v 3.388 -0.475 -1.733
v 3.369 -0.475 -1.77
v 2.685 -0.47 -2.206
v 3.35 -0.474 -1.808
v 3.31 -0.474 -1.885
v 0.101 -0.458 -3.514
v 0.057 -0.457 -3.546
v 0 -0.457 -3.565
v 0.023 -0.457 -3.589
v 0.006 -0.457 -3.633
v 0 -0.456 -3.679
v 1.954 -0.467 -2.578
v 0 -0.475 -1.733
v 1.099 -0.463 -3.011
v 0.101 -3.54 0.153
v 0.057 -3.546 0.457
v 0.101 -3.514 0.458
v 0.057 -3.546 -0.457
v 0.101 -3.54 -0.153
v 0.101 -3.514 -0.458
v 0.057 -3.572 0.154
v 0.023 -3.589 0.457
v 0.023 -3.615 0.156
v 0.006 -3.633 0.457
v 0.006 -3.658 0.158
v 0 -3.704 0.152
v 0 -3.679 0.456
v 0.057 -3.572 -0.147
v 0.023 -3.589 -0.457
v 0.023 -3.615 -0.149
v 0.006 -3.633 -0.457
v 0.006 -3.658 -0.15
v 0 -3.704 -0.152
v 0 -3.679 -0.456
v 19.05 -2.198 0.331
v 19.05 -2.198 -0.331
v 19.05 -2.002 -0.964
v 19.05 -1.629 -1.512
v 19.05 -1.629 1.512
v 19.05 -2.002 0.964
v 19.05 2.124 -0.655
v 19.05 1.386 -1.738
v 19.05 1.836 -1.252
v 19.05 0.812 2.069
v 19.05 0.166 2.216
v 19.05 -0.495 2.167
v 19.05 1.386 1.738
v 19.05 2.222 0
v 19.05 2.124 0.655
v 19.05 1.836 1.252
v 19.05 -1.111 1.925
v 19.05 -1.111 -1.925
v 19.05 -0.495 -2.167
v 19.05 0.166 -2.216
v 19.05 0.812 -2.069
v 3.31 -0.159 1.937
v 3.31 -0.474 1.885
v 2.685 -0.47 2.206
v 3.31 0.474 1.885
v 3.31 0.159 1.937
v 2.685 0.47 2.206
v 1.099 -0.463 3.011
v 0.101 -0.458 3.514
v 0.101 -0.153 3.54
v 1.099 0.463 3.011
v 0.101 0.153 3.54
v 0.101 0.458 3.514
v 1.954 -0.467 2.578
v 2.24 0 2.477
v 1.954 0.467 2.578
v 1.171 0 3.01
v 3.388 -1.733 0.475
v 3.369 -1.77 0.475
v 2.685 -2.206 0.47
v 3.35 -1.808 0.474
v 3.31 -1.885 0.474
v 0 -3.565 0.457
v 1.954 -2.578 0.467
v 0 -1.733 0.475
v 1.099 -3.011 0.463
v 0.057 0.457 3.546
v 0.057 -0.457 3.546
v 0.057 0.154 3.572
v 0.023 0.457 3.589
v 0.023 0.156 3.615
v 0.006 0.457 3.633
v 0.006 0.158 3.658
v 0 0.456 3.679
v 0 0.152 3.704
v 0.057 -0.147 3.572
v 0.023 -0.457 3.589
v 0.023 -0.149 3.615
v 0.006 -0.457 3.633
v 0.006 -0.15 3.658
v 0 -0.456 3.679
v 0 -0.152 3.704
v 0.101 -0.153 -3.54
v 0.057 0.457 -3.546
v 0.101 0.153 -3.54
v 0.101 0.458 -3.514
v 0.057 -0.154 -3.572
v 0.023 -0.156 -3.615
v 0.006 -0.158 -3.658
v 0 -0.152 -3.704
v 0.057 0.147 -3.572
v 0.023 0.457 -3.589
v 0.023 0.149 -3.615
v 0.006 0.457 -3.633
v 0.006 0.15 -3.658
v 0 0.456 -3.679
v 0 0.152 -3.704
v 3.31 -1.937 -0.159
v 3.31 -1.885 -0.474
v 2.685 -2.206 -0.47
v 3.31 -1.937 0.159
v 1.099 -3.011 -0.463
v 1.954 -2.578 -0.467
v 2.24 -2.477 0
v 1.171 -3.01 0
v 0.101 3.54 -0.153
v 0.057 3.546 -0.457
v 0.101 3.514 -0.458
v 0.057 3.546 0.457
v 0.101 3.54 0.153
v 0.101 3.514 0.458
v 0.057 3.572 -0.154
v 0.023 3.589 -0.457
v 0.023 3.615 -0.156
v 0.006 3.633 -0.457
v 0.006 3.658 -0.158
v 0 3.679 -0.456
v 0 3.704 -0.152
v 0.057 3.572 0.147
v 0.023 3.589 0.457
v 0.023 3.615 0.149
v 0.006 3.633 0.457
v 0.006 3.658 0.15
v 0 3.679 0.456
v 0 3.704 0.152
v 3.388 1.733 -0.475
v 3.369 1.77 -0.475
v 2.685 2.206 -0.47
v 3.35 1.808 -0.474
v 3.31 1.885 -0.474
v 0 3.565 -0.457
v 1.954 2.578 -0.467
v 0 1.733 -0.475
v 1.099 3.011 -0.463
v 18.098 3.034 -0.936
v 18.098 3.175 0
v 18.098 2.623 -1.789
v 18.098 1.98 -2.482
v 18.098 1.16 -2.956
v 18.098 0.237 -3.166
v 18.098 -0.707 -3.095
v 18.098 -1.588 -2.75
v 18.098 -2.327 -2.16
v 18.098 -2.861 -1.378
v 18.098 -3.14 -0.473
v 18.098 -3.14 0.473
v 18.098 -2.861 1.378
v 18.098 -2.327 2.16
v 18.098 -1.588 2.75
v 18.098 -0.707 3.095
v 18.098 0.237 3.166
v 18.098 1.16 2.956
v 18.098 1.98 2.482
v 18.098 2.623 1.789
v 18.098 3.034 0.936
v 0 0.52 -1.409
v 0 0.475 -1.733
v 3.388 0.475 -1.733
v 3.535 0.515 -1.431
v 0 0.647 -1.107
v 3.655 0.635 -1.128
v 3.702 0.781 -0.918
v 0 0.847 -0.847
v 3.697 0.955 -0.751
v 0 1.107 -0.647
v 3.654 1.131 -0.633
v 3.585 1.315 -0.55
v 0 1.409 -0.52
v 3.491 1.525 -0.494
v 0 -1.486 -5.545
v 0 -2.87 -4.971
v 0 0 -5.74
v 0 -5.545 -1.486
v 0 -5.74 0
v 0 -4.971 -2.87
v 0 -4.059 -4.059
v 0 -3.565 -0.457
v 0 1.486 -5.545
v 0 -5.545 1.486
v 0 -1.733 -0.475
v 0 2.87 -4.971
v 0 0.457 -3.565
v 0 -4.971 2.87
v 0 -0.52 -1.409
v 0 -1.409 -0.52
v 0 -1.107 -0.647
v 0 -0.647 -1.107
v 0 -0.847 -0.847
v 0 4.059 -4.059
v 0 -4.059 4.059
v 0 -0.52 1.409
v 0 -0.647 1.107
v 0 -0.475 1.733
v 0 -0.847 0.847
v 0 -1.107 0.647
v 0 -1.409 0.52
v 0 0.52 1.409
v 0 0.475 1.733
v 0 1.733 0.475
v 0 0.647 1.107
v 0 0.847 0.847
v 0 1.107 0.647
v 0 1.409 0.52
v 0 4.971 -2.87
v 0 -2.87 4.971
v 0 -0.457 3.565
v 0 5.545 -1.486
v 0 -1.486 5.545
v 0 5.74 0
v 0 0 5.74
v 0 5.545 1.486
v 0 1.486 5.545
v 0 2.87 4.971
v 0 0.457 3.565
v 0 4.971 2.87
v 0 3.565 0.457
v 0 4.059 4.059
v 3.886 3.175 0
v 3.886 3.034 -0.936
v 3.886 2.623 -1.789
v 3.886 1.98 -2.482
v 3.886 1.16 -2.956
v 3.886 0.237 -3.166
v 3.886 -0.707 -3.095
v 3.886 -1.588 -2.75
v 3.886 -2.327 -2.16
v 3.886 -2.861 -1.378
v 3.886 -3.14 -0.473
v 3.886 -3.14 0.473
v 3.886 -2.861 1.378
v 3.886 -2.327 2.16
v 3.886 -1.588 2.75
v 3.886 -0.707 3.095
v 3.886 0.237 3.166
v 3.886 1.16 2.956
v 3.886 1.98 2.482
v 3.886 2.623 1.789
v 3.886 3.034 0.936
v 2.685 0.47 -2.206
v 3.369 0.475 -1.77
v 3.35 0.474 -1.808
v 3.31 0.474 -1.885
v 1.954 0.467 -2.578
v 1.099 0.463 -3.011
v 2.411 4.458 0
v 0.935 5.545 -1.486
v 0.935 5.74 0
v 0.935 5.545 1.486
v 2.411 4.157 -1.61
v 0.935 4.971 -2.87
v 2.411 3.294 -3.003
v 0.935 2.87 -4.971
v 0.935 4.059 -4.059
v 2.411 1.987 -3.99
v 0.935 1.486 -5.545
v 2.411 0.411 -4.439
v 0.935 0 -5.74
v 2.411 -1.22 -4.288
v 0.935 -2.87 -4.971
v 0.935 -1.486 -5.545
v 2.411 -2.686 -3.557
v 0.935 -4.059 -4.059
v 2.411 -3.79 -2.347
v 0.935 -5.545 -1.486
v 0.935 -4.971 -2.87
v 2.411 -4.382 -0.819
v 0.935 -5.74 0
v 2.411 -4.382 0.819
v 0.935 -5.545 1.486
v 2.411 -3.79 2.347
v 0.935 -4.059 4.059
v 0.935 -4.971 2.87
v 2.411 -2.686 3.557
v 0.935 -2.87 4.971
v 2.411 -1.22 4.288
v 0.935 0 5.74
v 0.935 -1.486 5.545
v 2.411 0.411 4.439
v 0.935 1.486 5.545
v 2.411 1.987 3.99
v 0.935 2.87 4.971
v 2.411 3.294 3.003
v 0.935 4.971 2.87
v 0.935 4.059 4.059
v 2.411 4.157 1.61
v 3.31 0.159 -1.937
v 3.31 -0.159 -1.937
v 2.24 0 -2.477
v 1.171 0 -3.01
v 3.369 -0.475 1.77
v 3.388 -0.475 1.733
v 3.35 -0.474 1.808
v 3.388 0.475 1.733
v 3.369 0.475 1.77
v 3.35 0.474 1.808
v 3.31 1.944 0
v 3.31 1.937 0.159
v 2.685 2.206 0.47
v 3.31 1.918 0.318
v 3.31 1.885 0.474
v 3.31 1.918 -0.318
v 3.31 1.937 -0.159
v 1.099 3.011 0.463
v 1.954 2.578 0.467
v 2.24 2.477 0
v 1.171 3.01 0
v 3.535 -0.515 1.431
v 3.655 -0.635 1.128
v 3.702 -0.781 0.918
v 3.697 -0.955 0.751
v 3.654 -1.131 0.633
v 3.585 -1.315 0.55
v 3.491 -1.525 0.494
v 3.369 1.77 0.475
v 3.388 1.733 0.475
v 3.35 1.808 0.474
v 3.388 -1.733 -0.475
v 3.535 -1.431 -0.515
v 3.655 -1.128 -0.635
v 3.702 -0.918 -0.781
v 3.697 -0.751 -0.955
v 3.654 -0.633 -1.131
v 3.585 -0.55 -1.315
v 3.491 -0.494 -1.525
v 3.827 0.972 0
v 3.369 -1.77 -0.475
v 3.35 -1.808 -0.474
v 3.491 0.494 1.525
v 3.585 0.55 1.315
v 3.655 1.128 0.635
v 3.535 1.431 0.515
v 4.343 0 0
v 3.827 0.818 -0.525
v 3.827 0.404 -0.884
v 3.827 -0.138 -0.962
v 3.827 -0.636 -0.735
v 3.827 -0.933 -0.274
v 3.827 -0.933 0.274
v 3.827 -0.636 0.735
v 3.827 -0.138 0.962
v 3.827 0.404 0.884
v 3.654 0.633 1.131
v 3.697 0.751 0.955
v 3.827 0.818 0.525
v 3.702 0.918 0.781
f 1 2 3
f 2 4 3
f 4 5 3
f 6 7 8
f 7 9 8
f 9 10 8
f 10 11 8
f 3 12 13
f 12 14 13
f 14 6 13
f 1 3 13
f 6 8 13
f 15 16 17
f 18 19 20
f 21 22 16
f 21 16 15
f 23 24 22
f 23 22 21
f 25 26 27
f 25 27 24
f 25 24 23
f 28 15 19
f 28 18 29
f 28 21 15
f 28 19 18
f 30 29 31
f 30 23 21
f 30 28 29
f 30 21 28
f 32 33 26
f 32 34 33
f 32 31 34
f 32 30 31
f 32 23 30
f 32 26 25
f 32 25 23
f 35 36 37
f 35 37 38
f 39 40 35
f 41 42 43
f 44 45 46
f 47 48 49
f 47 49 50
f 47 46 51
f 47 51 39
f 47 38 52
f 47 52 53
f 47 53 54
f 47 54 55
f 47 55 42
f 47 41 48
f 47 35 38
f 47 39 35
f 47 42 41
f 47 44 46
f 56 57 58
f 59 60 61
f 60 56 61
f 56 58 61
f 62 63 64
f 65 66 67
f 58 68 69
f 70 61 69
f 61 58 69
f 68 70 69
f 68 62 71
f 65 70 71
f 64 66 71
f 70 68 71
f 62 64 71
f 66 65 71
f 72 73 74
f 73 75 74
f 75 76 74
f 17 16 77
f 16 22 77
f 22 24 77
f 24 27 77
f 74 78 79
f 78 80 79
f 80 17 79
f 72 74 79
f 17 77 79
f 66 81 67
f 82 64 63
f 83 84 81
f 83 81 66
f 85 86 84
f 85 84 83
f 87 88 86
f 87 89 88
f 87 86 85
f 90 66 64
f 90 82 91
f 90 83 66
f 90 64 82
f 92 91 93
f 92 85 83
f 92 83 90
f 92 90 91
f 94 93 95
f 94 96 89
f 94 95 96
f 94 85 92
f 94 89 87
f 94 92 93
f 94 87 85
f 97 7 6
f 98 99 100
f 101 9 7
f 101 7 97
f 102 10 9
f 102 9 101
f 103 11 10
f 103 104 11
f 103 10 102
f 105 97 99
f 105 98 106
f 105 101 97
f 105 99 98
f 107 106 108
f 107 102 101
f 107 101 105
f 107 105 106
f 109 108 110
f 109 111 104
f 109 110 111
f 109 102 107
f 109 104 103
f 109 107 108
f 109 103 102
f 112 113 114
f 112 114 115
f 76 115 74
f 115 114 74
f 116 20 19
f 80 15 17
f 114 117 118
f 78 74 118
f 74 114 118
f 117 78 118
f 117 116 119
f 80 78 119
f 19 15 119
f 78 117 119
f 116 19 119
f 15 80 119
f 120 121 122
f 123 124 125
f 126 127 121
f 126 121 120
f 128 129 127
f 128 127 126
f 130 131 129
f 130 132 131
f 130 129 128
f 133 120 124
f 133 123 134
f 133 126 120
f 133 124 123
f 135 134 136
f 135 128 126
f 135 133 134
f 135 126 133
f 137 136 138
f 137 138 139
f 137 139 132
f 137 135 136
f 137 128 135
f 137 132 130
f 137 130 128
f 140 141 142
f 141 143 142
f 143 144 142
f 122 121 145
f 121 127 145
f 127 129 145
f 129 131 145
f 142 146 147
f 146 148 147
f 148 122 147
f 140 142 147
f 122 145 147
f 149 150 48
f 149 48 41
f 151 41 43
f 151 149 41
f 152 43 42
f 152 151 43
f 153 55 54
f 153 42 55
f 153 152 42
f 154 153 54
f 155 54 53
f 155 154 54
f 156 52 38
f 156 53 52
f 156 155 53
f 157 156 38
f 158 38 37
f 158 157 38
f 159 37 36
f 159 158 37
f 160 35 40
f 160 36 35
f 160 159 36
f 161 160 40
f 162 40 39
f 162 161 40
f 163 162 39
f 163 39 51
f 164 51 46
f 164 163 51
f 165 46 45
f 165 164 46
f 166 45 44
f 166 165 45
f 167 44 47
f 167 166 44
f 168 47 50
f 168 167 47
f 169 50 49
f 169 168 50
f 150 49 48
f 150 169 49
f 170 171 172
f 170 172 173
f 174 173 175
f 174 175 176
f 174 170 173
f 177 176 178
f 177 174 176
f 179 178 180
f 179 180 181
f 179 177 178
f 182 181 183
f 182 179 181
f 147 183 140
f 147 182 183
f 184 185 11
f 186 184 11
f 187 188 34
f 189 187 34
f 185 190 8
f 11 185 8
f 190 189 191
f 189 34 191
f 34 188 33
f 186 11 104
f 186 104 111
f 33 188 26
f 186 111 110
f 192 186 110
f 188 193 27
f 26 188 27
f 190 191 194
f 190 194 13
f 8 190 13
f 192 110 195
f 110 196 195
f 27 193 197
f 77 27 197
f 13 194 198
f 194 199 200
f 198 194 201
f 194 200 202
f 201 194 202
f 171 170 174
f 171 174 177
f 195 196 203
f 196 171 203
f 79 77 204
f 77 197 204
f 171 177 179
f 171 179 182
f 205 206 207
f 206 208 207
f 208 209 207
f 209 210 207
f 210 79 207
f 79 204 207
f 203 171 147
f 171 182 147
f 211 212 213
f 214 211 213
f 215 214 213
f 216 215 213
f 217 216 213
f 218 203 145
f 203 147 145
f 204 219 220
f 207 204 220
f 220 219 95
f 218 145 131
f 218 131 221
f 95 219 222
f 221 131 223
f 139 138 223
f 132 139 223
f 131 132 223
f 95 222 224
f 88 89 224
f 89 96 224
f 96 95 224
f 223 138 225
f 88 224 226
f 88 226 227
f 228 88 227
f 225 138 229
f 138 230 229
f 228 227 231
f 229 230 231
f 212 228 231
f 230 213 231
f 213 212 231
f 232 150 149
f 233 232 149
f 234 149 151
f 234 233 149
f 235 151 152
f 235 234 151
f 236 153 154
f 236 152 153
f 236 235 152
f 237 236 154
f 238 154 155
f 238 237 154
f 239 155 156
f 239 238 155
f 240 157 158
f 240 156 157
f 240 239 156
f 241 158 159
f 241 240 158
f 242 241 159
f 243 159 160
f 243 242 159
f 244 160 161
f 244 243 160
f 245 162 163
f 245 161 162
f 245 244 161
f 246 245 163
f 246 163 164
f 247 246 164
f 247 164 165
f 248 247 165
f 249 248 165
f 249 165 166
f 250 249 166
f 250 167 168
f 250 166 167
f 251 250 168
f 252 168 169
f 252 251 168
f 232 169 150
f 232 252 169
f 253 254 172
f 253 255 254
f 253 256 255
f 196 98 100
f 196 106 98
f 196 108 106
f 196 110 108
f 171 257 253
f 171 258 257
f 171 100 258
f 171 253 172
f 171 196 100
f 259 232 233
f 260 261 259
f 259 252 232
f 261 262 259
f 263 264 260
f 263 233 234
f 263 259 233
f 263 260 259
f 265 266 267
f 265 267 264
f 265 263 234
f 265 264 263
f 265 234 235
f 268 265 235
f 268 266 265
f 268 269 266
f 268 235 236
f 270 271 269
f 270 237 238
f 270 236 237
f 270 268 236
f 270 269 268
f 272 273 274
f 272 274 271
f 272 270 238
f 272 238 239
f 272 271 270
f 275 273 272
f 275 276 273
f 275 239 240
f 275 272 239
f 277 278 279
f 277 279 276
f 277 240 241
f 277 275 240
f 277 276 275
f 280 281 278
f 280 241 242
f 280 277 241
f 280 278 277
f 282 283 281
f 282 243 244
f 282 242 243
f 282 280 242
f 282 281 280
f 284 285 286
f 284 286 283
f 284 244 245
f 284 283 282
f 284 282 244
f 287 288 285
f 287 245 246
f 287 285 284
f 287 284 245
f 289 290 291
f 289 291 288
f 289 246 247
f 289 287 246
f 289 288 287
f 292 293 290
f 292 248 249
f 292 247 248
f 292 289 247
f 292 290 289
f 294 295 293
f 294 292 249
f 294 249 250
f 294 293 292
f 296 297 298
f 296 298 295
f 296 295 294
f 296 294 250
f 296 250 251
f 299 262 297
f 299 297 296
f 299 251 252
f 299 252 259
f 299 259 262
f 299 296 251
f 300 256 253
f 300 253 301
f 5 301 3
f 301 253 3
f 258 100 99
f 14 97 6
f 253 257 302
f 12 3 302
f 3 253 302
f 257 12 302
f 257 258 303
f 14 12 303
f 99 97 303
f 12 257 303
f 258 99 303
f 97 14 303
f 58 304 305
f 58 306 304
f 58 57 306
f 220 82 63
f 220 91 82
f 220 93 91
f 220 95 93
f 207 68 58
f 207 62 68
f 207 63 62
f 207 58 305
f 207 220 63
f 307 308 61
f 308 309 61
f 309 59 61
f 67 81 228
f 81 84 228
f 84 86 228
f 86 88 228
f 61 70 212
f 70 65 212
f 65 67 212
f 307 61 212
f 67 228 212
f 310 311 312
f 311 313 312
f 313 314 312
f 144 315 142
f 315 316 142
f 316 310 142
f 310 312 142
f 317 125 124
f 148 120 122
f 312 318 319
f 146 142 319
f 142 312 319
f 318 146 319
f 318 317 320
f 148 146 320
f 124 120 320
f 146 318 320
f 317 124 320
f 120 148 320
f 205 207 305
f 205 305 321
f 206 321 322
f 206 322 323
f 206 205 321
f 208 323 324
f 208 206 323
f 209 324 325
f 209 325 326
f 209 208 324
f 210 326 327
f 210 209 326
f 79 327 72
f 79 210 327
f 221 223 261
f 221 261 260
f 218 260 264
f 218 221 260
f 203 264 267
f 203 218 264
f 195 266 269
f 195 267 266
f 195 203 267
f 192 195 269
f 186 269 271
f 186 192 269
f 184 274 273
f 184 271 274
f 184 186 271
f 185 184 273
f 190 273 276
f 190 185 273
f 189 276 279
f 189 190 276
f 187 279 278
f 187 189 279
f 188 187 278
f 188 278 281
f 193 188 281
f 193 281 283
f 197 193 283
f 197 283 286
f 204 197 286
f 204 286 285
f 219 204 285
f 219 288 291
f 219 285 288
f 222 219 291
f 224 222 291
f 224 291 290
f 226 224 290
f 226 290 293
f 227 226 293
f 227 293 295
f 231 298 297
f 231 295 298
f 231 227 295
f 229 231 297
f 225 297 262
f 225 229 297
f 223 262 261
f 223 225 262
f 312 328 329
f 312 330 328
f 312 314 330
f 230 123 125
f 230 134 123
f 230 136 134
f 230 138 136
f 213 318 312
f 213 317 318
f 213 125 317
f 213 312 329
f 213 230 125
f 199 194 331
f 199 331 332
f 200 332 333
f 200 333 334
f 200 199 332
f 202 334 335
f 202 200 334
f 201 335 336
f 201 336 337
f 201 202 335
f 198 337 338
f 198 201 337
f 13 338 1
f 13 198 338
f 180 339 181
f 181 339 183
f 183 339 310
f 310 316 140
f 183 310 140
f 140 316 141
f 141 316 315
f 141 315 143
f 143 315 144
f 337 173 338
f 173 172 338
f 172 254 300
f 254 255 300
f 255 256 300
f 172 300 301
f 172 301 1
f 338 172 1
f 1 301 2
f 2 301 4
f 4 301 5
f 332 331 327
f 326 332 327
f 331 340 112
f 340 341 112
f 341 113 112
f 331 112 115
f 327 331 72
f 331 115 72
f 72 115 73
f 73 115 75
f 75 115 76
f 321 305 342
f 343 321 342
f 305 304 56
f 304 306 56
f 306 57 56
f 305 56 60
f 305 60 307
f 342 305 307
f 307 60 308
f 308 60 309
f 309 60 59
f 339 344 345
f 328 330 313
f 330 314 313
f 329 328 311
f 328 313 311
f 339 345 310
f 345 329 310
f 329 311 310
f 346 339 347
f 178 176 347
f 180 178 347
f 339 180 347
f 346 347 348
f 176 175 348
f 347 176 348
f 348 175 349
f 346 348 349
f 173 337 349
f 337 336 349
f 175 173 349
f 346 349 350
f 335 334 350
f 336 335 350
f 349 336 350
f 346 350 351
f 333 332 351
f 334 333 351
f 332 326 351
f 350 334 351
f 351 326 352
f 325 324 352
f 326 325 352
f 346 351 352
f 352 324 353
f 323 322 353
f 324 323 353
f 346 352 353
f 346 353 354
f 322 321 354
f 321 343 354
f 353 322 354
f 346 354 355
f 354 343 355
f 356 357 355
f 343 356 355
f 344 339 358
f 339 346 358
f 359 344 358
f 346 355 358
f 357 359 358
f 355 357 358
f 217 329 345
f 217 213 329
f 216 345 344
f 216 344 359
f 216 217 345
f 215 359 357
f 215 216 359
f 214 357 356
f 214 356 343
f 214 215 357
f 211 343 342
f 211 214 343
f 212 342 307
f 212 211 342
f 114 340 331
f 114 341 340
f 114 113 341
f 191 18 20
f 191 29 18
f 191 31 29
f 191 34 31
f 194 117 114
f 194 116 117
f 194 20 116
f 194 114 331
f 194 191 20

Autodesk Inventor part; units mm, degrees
ref_plane "YZ Plane" through (0, 0, 0) normal (1, 0, 0) x (0, 1, 0)
ref_plane "XZ Plane" through (0, 0, 0) normal (0, 1, 0) x (-1, 0, 0)
sketch "Sketch1" plane through (0, 0, 0) normal (0, 0, 1) x (1, 0, 0)
  line L0 (4.3434, 0) -> (19.05, 0)
  line L1 (19.05, 0) -> (19.05, 3.175)
  line L2 (19.05, 3.175) -> (3.8862, 3.175)
  line L3 (0.935, 5.7404) -> (0, 5.7404)
  line L4 (-3.81, 0) -> (22.86, 0) projected
  line L5 (0, -1.1481) -> (0, 6.8885) projected
  line L6 (0, 3.5941) -> (3.3098, 1.9439)
  line L7 (3.3098, 1.9439) -> (4.3434, 0)
  line L8 (3.8862, 3.175) -> (0.935, 5.7404)
  line L9 (0, 5.7404) -> (0, 3.5941)
  dimension "d2" = 6.35
  dimension "d3" = 11.4808
  dimension "d4" = 4.3434
  dimension "d5" = 7.1882
  dimension "d6" = 26.5
  dimension "d7" = 62
  dimension "d13" = 41
  dimension "d14" = 3.8862
  dimension "d15" = 19.05
revolve "Body" add sketch "Sketch1" angle 360 about axis through (4.3434, 0, 0) along (1, 0, 0) contours L7 L6 L5 L3 L8 L2 L1 L0
sketch "Sketch2" plane through (0, 0, 0) normal (-1, 0, 0) x (0, 0, 1)
  line L0 (0, -8.0366) -> (0, 8.0366) projected
  line L1 (-8.0366, 0) -> (8.0366, 0) projected
  line L2 (0, 3.5941) -> (0, 0) construction
  line L3 (0, 0) -> (3.5941, 0) construction
  arc A0 (1.198, 0) -> (0, 1.198) centre (0, 0) ccw
  line L4 (0, 0) -> (0.7947, 0.7947) construction
  arc A1 (1.797, 0) -> (0, 1.797) centre (0, 0) ccw construction
  line L5 (0.4572, 3.5649) -> (0.4751, 1.7331)
  line L6 (3.5649, 0.4572) -> (1.7331, 0.4751)
  arc A2 (0.4751, 1.7331) -> (1.7331, 0.4751) centre (1.7455, 1.7455) ccw
  arc A3 (3.5941, 0) -> (3.5649, 0.4572) centre (0, 0) ccw
  arc A4 (0.4572, 3.5649) -> (0, 3.5941) centre (0, 0) ccw
  arc A5 (3.5649, 0.4572) -> (0.4572, 3.5649) centre (0, 0) ccw
  line L7 (0.4572, -3.5649) -> (0.4751, -1.7331)
  line L8 (3.5649, -0.4572) -> (1.7331, -0.4751)
  arc A6 (1.7331, -0.4751) -> (0.4751, -1.7331) centre (1.7455, -1.7455) ccw
  arc A7 (3.5649, -0.4572) -> (3.5941, 0) centre (0, 0) ccw
  arc A8 (0, -3.5941) -> (0.4572, -3.5649) centre (0, 0) ccw
  arc A9 (0.4572, -3.5649) -> (3.5649, -0.4572) centre (0, 0) ccw
  line L9 (-0.4572, 3.5649) -> (-0.4751, 1.7331)
  line L10 (-3.5649, 0.4572) -> (-1.7331, 0.4751)
  arc A10 (-1.7331, 0.4751) -> (-0.4751, 1.7331) centre (-1.7455, 1.7455) ccw
  arc A11 (-3.5649, 0.4572) -> (-3.5941, 0) centre (0, 0) ccw
  arc A12 (0, 3.5941) -> (-0.4572, 3.5649) centre (0, 0) ccw
  arc A13 (-0.4572, 3.5649) -> (-3.5649, 0.4572) centre (0, 0) ccw
  arc A14 (-3.5649, -0.4572) -> (-0.4572, -3.5649) centre (0, 0) ccw
  arc A15 (-0.4572, -3.5649) -> (0, -3.5941) centre (0, 0) ccw
  arc A16 (-3.5941, 0) -> (-3.5649, -0.4572) centre (0, 0) ccw
  line L11 (-3.5649, -0.4572) -> (-1.7331, -0.4751)
  arc A17 (-0.4751, -1.7331) -> (-1.7331, -0.4751) centre (-1.7455, -1.7455) ccw
  line L12 (-0.4572, -3.5649) -> (-0.4751, -1.7331)
  dimension "d18" = 45
  dimension "d19" = 2.3961
  dimension "d20" = 3.5941
  dimension "d21" = 7.1882
  dimension "d22" = 0.4572
extrude "Slot" add sketch "Sketch2" against normal up to next contours A2 L5 A5 L6 | L9 A10 L10 A13 | L7 A6 L8 A9 | A14 L11 A17 L12
fillet "Fillet1" radius 0.1829 4 edges at (0, 3.5941, 0) (0, 0, 3.5941) (0, -3.5941, 0) (0, 0, -3.5941)
thread "Thread" size "1/4-20 UNC" class "2A" standard "ANSI Unified Screw Threads" length 11.9888
chamfer "Chamfer1" distance 0.9525 distance2 0.9525 1 edges at (19.05, -3.175, 0) measured on face at (19.05, -0.3658, -0.0841)
ref_plane "Work Plane2" through (2.032, 0, 0) normal (0, 1, 0) x (1, 0, 0)
equation "\"d2\" = GD"
equation "\"d3\" = KOD"
equation "\"d4\" = INTI"
equation "\"d5\" = SDM"
equation "\"d13\" = 0.5 * SEWI"
equation "\"d14\" = KOH"
equation "\"d15\" = NLG"
equation "\"d19\" = 0.333333 * SDM"
equation "\"d20\" = 0.5 * SDM"
equation "\"d21\" = SDM"
equation "\"d22\" = 0.5 * SBR"
equation "\"d45\" = INTI"
equation "\"d25\" = 0.2 * SBR"
equation "\"d9\" = GEL"
equation "\"d11\" = -0.5 * SPD + 0.5 * GD"
equation "\"d12\" = GUL"
equation "\"GD\" = NND"
equation "\"NLG\" = 19.05"
equation "\"GEL\" = 11.9888"
equation "\"KOD\" = 11.4808"
equation "\"KOH\" = 3.8862"
equation "\"SDM\" = 7.1882"
equation "\"INTI\" = 4.3434"
equation "\"SBR\" = 0.9144"
equation "\"GUL\" = 0.75 * GAL"
equation "\"SPD\" = 4.445"
equation "\"SEWI\" = 82deg"
equation "\"d0\" = NLG"
equation "\"d1\" = KOH"
equation "\"d17\" = SDM"
equation "\"TOA\" = 30deg"
equation "\"THREADDIA\" = 6.35"
equation "\"BDM\" = NND"
equation "\"NND\" = 6.35"
equation "\"GAL\" = 1.27"
equation "\"GD1\" = SPD"
properties part number "ANSI B18.6.3 - 1/4-20 x 3/4, CRFCHMSTII(5)" material "Steel, Mild"
